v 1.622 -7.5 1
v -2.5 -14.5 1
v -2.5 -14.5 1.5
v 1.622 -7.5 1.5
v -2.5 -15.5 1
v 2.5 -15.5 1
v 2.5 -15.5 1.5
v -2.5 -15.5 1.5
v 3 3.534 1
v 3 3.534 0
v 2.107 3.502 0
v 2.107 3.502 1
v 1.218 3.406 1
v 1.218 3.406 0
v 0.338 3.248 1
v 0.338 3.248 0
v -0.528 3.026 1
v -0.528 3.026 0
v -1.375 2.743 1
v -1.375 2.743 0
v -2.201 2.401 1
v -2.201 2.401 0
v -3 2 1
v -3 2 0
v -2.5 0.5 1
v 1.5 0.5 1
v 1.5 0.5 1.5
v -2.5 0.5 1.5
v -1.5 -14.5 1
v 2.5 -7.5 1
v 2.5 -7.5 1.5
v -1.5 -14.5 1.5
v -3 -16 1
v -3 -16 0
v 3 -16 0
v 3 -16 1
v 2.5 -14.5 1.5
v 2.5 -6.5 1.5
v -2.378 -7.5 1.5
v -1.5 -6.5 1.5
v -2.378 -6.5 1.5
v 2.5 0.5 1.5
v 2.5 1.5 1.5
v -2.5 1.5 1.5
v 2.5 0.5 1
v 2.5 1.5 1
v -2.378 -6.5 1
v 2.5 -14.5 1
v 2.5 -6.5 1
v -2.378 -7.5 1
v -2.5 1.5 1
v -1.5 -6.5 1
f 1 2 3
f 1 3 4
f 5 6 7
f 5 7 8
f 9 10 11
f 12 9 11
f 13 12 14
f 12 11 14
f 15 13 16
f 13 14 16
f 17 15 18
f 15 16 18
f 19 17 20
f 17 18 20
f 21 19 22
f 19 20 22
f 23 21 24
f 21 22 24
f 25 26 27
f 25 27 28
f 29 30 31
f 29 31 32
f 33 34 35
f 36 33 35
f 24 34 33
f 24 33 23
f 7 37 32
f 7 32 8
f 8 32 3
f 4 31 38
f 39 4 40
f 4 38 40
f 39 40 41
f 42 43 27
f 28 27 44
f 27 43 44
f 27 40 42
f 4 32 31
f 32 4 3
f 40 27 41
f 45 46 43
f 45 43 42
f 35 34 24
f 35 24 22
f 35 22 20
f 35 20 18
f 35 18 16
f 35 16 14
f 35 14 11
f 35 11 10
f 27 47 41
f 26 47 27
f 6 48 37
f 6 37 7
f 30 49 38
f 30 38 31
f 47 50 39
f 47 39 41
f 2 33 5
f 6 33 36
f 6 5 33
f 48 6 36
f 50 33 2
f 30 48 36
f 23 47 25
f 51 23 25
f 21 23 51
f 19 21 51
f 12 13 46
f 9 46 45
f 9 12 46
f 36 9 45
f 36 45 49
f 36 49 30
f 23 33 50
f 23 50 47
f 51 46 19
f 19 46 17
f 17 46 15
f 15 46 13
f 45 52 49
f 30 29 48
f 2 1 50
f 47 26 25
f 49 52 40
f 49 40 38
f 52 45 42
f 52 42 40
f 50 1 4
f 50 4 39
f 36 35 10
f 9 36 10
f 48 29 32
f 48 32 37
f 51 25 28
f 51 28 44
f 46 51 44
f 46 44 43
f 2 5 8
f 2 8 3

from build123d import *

# Parameters (mm, degrees)
PAD_DEPTH    = 1
PAD001_DEPTH = 0.5


with BuildPart() as part:
    # Sketch → Pad (new body)
    with BuildSketch(Plane.XY):
        with BuildLine():
            Line((-3, -16), (3, -16))
            Line((3, -16), (3, 3.534144))
            ThreePointArc((3, 3.534144), (-0.096514, 3.144536), (-3, 2))
            Line((-3, -16), (-3, 2))
        make_face()
    extrude(amount=PAD_DEPTH)

    # Sketch001 → Pad001 (new body)
    with BuildSketch(Plane.XY.offset(1)):
        Polygon((-2.5, 1.5), (2.5, 1.5), (2.5, 0.5), (-1.5, -6.5), (2.5, -6.5), (2.5, -7.5), (-1.5, -14.5), (2.5, -14.5), (2.5, -15.5), (-2.5, -15.5), (-2.5, -14.5), (1.621962, -7.5), (-2.378038, -7.5), (-2.378038, -6.5), (1.5, 0.5), (-2.5, 0.5), align=None)
    extrude(amount=PAD001_DEPTH)


solid = part.part
